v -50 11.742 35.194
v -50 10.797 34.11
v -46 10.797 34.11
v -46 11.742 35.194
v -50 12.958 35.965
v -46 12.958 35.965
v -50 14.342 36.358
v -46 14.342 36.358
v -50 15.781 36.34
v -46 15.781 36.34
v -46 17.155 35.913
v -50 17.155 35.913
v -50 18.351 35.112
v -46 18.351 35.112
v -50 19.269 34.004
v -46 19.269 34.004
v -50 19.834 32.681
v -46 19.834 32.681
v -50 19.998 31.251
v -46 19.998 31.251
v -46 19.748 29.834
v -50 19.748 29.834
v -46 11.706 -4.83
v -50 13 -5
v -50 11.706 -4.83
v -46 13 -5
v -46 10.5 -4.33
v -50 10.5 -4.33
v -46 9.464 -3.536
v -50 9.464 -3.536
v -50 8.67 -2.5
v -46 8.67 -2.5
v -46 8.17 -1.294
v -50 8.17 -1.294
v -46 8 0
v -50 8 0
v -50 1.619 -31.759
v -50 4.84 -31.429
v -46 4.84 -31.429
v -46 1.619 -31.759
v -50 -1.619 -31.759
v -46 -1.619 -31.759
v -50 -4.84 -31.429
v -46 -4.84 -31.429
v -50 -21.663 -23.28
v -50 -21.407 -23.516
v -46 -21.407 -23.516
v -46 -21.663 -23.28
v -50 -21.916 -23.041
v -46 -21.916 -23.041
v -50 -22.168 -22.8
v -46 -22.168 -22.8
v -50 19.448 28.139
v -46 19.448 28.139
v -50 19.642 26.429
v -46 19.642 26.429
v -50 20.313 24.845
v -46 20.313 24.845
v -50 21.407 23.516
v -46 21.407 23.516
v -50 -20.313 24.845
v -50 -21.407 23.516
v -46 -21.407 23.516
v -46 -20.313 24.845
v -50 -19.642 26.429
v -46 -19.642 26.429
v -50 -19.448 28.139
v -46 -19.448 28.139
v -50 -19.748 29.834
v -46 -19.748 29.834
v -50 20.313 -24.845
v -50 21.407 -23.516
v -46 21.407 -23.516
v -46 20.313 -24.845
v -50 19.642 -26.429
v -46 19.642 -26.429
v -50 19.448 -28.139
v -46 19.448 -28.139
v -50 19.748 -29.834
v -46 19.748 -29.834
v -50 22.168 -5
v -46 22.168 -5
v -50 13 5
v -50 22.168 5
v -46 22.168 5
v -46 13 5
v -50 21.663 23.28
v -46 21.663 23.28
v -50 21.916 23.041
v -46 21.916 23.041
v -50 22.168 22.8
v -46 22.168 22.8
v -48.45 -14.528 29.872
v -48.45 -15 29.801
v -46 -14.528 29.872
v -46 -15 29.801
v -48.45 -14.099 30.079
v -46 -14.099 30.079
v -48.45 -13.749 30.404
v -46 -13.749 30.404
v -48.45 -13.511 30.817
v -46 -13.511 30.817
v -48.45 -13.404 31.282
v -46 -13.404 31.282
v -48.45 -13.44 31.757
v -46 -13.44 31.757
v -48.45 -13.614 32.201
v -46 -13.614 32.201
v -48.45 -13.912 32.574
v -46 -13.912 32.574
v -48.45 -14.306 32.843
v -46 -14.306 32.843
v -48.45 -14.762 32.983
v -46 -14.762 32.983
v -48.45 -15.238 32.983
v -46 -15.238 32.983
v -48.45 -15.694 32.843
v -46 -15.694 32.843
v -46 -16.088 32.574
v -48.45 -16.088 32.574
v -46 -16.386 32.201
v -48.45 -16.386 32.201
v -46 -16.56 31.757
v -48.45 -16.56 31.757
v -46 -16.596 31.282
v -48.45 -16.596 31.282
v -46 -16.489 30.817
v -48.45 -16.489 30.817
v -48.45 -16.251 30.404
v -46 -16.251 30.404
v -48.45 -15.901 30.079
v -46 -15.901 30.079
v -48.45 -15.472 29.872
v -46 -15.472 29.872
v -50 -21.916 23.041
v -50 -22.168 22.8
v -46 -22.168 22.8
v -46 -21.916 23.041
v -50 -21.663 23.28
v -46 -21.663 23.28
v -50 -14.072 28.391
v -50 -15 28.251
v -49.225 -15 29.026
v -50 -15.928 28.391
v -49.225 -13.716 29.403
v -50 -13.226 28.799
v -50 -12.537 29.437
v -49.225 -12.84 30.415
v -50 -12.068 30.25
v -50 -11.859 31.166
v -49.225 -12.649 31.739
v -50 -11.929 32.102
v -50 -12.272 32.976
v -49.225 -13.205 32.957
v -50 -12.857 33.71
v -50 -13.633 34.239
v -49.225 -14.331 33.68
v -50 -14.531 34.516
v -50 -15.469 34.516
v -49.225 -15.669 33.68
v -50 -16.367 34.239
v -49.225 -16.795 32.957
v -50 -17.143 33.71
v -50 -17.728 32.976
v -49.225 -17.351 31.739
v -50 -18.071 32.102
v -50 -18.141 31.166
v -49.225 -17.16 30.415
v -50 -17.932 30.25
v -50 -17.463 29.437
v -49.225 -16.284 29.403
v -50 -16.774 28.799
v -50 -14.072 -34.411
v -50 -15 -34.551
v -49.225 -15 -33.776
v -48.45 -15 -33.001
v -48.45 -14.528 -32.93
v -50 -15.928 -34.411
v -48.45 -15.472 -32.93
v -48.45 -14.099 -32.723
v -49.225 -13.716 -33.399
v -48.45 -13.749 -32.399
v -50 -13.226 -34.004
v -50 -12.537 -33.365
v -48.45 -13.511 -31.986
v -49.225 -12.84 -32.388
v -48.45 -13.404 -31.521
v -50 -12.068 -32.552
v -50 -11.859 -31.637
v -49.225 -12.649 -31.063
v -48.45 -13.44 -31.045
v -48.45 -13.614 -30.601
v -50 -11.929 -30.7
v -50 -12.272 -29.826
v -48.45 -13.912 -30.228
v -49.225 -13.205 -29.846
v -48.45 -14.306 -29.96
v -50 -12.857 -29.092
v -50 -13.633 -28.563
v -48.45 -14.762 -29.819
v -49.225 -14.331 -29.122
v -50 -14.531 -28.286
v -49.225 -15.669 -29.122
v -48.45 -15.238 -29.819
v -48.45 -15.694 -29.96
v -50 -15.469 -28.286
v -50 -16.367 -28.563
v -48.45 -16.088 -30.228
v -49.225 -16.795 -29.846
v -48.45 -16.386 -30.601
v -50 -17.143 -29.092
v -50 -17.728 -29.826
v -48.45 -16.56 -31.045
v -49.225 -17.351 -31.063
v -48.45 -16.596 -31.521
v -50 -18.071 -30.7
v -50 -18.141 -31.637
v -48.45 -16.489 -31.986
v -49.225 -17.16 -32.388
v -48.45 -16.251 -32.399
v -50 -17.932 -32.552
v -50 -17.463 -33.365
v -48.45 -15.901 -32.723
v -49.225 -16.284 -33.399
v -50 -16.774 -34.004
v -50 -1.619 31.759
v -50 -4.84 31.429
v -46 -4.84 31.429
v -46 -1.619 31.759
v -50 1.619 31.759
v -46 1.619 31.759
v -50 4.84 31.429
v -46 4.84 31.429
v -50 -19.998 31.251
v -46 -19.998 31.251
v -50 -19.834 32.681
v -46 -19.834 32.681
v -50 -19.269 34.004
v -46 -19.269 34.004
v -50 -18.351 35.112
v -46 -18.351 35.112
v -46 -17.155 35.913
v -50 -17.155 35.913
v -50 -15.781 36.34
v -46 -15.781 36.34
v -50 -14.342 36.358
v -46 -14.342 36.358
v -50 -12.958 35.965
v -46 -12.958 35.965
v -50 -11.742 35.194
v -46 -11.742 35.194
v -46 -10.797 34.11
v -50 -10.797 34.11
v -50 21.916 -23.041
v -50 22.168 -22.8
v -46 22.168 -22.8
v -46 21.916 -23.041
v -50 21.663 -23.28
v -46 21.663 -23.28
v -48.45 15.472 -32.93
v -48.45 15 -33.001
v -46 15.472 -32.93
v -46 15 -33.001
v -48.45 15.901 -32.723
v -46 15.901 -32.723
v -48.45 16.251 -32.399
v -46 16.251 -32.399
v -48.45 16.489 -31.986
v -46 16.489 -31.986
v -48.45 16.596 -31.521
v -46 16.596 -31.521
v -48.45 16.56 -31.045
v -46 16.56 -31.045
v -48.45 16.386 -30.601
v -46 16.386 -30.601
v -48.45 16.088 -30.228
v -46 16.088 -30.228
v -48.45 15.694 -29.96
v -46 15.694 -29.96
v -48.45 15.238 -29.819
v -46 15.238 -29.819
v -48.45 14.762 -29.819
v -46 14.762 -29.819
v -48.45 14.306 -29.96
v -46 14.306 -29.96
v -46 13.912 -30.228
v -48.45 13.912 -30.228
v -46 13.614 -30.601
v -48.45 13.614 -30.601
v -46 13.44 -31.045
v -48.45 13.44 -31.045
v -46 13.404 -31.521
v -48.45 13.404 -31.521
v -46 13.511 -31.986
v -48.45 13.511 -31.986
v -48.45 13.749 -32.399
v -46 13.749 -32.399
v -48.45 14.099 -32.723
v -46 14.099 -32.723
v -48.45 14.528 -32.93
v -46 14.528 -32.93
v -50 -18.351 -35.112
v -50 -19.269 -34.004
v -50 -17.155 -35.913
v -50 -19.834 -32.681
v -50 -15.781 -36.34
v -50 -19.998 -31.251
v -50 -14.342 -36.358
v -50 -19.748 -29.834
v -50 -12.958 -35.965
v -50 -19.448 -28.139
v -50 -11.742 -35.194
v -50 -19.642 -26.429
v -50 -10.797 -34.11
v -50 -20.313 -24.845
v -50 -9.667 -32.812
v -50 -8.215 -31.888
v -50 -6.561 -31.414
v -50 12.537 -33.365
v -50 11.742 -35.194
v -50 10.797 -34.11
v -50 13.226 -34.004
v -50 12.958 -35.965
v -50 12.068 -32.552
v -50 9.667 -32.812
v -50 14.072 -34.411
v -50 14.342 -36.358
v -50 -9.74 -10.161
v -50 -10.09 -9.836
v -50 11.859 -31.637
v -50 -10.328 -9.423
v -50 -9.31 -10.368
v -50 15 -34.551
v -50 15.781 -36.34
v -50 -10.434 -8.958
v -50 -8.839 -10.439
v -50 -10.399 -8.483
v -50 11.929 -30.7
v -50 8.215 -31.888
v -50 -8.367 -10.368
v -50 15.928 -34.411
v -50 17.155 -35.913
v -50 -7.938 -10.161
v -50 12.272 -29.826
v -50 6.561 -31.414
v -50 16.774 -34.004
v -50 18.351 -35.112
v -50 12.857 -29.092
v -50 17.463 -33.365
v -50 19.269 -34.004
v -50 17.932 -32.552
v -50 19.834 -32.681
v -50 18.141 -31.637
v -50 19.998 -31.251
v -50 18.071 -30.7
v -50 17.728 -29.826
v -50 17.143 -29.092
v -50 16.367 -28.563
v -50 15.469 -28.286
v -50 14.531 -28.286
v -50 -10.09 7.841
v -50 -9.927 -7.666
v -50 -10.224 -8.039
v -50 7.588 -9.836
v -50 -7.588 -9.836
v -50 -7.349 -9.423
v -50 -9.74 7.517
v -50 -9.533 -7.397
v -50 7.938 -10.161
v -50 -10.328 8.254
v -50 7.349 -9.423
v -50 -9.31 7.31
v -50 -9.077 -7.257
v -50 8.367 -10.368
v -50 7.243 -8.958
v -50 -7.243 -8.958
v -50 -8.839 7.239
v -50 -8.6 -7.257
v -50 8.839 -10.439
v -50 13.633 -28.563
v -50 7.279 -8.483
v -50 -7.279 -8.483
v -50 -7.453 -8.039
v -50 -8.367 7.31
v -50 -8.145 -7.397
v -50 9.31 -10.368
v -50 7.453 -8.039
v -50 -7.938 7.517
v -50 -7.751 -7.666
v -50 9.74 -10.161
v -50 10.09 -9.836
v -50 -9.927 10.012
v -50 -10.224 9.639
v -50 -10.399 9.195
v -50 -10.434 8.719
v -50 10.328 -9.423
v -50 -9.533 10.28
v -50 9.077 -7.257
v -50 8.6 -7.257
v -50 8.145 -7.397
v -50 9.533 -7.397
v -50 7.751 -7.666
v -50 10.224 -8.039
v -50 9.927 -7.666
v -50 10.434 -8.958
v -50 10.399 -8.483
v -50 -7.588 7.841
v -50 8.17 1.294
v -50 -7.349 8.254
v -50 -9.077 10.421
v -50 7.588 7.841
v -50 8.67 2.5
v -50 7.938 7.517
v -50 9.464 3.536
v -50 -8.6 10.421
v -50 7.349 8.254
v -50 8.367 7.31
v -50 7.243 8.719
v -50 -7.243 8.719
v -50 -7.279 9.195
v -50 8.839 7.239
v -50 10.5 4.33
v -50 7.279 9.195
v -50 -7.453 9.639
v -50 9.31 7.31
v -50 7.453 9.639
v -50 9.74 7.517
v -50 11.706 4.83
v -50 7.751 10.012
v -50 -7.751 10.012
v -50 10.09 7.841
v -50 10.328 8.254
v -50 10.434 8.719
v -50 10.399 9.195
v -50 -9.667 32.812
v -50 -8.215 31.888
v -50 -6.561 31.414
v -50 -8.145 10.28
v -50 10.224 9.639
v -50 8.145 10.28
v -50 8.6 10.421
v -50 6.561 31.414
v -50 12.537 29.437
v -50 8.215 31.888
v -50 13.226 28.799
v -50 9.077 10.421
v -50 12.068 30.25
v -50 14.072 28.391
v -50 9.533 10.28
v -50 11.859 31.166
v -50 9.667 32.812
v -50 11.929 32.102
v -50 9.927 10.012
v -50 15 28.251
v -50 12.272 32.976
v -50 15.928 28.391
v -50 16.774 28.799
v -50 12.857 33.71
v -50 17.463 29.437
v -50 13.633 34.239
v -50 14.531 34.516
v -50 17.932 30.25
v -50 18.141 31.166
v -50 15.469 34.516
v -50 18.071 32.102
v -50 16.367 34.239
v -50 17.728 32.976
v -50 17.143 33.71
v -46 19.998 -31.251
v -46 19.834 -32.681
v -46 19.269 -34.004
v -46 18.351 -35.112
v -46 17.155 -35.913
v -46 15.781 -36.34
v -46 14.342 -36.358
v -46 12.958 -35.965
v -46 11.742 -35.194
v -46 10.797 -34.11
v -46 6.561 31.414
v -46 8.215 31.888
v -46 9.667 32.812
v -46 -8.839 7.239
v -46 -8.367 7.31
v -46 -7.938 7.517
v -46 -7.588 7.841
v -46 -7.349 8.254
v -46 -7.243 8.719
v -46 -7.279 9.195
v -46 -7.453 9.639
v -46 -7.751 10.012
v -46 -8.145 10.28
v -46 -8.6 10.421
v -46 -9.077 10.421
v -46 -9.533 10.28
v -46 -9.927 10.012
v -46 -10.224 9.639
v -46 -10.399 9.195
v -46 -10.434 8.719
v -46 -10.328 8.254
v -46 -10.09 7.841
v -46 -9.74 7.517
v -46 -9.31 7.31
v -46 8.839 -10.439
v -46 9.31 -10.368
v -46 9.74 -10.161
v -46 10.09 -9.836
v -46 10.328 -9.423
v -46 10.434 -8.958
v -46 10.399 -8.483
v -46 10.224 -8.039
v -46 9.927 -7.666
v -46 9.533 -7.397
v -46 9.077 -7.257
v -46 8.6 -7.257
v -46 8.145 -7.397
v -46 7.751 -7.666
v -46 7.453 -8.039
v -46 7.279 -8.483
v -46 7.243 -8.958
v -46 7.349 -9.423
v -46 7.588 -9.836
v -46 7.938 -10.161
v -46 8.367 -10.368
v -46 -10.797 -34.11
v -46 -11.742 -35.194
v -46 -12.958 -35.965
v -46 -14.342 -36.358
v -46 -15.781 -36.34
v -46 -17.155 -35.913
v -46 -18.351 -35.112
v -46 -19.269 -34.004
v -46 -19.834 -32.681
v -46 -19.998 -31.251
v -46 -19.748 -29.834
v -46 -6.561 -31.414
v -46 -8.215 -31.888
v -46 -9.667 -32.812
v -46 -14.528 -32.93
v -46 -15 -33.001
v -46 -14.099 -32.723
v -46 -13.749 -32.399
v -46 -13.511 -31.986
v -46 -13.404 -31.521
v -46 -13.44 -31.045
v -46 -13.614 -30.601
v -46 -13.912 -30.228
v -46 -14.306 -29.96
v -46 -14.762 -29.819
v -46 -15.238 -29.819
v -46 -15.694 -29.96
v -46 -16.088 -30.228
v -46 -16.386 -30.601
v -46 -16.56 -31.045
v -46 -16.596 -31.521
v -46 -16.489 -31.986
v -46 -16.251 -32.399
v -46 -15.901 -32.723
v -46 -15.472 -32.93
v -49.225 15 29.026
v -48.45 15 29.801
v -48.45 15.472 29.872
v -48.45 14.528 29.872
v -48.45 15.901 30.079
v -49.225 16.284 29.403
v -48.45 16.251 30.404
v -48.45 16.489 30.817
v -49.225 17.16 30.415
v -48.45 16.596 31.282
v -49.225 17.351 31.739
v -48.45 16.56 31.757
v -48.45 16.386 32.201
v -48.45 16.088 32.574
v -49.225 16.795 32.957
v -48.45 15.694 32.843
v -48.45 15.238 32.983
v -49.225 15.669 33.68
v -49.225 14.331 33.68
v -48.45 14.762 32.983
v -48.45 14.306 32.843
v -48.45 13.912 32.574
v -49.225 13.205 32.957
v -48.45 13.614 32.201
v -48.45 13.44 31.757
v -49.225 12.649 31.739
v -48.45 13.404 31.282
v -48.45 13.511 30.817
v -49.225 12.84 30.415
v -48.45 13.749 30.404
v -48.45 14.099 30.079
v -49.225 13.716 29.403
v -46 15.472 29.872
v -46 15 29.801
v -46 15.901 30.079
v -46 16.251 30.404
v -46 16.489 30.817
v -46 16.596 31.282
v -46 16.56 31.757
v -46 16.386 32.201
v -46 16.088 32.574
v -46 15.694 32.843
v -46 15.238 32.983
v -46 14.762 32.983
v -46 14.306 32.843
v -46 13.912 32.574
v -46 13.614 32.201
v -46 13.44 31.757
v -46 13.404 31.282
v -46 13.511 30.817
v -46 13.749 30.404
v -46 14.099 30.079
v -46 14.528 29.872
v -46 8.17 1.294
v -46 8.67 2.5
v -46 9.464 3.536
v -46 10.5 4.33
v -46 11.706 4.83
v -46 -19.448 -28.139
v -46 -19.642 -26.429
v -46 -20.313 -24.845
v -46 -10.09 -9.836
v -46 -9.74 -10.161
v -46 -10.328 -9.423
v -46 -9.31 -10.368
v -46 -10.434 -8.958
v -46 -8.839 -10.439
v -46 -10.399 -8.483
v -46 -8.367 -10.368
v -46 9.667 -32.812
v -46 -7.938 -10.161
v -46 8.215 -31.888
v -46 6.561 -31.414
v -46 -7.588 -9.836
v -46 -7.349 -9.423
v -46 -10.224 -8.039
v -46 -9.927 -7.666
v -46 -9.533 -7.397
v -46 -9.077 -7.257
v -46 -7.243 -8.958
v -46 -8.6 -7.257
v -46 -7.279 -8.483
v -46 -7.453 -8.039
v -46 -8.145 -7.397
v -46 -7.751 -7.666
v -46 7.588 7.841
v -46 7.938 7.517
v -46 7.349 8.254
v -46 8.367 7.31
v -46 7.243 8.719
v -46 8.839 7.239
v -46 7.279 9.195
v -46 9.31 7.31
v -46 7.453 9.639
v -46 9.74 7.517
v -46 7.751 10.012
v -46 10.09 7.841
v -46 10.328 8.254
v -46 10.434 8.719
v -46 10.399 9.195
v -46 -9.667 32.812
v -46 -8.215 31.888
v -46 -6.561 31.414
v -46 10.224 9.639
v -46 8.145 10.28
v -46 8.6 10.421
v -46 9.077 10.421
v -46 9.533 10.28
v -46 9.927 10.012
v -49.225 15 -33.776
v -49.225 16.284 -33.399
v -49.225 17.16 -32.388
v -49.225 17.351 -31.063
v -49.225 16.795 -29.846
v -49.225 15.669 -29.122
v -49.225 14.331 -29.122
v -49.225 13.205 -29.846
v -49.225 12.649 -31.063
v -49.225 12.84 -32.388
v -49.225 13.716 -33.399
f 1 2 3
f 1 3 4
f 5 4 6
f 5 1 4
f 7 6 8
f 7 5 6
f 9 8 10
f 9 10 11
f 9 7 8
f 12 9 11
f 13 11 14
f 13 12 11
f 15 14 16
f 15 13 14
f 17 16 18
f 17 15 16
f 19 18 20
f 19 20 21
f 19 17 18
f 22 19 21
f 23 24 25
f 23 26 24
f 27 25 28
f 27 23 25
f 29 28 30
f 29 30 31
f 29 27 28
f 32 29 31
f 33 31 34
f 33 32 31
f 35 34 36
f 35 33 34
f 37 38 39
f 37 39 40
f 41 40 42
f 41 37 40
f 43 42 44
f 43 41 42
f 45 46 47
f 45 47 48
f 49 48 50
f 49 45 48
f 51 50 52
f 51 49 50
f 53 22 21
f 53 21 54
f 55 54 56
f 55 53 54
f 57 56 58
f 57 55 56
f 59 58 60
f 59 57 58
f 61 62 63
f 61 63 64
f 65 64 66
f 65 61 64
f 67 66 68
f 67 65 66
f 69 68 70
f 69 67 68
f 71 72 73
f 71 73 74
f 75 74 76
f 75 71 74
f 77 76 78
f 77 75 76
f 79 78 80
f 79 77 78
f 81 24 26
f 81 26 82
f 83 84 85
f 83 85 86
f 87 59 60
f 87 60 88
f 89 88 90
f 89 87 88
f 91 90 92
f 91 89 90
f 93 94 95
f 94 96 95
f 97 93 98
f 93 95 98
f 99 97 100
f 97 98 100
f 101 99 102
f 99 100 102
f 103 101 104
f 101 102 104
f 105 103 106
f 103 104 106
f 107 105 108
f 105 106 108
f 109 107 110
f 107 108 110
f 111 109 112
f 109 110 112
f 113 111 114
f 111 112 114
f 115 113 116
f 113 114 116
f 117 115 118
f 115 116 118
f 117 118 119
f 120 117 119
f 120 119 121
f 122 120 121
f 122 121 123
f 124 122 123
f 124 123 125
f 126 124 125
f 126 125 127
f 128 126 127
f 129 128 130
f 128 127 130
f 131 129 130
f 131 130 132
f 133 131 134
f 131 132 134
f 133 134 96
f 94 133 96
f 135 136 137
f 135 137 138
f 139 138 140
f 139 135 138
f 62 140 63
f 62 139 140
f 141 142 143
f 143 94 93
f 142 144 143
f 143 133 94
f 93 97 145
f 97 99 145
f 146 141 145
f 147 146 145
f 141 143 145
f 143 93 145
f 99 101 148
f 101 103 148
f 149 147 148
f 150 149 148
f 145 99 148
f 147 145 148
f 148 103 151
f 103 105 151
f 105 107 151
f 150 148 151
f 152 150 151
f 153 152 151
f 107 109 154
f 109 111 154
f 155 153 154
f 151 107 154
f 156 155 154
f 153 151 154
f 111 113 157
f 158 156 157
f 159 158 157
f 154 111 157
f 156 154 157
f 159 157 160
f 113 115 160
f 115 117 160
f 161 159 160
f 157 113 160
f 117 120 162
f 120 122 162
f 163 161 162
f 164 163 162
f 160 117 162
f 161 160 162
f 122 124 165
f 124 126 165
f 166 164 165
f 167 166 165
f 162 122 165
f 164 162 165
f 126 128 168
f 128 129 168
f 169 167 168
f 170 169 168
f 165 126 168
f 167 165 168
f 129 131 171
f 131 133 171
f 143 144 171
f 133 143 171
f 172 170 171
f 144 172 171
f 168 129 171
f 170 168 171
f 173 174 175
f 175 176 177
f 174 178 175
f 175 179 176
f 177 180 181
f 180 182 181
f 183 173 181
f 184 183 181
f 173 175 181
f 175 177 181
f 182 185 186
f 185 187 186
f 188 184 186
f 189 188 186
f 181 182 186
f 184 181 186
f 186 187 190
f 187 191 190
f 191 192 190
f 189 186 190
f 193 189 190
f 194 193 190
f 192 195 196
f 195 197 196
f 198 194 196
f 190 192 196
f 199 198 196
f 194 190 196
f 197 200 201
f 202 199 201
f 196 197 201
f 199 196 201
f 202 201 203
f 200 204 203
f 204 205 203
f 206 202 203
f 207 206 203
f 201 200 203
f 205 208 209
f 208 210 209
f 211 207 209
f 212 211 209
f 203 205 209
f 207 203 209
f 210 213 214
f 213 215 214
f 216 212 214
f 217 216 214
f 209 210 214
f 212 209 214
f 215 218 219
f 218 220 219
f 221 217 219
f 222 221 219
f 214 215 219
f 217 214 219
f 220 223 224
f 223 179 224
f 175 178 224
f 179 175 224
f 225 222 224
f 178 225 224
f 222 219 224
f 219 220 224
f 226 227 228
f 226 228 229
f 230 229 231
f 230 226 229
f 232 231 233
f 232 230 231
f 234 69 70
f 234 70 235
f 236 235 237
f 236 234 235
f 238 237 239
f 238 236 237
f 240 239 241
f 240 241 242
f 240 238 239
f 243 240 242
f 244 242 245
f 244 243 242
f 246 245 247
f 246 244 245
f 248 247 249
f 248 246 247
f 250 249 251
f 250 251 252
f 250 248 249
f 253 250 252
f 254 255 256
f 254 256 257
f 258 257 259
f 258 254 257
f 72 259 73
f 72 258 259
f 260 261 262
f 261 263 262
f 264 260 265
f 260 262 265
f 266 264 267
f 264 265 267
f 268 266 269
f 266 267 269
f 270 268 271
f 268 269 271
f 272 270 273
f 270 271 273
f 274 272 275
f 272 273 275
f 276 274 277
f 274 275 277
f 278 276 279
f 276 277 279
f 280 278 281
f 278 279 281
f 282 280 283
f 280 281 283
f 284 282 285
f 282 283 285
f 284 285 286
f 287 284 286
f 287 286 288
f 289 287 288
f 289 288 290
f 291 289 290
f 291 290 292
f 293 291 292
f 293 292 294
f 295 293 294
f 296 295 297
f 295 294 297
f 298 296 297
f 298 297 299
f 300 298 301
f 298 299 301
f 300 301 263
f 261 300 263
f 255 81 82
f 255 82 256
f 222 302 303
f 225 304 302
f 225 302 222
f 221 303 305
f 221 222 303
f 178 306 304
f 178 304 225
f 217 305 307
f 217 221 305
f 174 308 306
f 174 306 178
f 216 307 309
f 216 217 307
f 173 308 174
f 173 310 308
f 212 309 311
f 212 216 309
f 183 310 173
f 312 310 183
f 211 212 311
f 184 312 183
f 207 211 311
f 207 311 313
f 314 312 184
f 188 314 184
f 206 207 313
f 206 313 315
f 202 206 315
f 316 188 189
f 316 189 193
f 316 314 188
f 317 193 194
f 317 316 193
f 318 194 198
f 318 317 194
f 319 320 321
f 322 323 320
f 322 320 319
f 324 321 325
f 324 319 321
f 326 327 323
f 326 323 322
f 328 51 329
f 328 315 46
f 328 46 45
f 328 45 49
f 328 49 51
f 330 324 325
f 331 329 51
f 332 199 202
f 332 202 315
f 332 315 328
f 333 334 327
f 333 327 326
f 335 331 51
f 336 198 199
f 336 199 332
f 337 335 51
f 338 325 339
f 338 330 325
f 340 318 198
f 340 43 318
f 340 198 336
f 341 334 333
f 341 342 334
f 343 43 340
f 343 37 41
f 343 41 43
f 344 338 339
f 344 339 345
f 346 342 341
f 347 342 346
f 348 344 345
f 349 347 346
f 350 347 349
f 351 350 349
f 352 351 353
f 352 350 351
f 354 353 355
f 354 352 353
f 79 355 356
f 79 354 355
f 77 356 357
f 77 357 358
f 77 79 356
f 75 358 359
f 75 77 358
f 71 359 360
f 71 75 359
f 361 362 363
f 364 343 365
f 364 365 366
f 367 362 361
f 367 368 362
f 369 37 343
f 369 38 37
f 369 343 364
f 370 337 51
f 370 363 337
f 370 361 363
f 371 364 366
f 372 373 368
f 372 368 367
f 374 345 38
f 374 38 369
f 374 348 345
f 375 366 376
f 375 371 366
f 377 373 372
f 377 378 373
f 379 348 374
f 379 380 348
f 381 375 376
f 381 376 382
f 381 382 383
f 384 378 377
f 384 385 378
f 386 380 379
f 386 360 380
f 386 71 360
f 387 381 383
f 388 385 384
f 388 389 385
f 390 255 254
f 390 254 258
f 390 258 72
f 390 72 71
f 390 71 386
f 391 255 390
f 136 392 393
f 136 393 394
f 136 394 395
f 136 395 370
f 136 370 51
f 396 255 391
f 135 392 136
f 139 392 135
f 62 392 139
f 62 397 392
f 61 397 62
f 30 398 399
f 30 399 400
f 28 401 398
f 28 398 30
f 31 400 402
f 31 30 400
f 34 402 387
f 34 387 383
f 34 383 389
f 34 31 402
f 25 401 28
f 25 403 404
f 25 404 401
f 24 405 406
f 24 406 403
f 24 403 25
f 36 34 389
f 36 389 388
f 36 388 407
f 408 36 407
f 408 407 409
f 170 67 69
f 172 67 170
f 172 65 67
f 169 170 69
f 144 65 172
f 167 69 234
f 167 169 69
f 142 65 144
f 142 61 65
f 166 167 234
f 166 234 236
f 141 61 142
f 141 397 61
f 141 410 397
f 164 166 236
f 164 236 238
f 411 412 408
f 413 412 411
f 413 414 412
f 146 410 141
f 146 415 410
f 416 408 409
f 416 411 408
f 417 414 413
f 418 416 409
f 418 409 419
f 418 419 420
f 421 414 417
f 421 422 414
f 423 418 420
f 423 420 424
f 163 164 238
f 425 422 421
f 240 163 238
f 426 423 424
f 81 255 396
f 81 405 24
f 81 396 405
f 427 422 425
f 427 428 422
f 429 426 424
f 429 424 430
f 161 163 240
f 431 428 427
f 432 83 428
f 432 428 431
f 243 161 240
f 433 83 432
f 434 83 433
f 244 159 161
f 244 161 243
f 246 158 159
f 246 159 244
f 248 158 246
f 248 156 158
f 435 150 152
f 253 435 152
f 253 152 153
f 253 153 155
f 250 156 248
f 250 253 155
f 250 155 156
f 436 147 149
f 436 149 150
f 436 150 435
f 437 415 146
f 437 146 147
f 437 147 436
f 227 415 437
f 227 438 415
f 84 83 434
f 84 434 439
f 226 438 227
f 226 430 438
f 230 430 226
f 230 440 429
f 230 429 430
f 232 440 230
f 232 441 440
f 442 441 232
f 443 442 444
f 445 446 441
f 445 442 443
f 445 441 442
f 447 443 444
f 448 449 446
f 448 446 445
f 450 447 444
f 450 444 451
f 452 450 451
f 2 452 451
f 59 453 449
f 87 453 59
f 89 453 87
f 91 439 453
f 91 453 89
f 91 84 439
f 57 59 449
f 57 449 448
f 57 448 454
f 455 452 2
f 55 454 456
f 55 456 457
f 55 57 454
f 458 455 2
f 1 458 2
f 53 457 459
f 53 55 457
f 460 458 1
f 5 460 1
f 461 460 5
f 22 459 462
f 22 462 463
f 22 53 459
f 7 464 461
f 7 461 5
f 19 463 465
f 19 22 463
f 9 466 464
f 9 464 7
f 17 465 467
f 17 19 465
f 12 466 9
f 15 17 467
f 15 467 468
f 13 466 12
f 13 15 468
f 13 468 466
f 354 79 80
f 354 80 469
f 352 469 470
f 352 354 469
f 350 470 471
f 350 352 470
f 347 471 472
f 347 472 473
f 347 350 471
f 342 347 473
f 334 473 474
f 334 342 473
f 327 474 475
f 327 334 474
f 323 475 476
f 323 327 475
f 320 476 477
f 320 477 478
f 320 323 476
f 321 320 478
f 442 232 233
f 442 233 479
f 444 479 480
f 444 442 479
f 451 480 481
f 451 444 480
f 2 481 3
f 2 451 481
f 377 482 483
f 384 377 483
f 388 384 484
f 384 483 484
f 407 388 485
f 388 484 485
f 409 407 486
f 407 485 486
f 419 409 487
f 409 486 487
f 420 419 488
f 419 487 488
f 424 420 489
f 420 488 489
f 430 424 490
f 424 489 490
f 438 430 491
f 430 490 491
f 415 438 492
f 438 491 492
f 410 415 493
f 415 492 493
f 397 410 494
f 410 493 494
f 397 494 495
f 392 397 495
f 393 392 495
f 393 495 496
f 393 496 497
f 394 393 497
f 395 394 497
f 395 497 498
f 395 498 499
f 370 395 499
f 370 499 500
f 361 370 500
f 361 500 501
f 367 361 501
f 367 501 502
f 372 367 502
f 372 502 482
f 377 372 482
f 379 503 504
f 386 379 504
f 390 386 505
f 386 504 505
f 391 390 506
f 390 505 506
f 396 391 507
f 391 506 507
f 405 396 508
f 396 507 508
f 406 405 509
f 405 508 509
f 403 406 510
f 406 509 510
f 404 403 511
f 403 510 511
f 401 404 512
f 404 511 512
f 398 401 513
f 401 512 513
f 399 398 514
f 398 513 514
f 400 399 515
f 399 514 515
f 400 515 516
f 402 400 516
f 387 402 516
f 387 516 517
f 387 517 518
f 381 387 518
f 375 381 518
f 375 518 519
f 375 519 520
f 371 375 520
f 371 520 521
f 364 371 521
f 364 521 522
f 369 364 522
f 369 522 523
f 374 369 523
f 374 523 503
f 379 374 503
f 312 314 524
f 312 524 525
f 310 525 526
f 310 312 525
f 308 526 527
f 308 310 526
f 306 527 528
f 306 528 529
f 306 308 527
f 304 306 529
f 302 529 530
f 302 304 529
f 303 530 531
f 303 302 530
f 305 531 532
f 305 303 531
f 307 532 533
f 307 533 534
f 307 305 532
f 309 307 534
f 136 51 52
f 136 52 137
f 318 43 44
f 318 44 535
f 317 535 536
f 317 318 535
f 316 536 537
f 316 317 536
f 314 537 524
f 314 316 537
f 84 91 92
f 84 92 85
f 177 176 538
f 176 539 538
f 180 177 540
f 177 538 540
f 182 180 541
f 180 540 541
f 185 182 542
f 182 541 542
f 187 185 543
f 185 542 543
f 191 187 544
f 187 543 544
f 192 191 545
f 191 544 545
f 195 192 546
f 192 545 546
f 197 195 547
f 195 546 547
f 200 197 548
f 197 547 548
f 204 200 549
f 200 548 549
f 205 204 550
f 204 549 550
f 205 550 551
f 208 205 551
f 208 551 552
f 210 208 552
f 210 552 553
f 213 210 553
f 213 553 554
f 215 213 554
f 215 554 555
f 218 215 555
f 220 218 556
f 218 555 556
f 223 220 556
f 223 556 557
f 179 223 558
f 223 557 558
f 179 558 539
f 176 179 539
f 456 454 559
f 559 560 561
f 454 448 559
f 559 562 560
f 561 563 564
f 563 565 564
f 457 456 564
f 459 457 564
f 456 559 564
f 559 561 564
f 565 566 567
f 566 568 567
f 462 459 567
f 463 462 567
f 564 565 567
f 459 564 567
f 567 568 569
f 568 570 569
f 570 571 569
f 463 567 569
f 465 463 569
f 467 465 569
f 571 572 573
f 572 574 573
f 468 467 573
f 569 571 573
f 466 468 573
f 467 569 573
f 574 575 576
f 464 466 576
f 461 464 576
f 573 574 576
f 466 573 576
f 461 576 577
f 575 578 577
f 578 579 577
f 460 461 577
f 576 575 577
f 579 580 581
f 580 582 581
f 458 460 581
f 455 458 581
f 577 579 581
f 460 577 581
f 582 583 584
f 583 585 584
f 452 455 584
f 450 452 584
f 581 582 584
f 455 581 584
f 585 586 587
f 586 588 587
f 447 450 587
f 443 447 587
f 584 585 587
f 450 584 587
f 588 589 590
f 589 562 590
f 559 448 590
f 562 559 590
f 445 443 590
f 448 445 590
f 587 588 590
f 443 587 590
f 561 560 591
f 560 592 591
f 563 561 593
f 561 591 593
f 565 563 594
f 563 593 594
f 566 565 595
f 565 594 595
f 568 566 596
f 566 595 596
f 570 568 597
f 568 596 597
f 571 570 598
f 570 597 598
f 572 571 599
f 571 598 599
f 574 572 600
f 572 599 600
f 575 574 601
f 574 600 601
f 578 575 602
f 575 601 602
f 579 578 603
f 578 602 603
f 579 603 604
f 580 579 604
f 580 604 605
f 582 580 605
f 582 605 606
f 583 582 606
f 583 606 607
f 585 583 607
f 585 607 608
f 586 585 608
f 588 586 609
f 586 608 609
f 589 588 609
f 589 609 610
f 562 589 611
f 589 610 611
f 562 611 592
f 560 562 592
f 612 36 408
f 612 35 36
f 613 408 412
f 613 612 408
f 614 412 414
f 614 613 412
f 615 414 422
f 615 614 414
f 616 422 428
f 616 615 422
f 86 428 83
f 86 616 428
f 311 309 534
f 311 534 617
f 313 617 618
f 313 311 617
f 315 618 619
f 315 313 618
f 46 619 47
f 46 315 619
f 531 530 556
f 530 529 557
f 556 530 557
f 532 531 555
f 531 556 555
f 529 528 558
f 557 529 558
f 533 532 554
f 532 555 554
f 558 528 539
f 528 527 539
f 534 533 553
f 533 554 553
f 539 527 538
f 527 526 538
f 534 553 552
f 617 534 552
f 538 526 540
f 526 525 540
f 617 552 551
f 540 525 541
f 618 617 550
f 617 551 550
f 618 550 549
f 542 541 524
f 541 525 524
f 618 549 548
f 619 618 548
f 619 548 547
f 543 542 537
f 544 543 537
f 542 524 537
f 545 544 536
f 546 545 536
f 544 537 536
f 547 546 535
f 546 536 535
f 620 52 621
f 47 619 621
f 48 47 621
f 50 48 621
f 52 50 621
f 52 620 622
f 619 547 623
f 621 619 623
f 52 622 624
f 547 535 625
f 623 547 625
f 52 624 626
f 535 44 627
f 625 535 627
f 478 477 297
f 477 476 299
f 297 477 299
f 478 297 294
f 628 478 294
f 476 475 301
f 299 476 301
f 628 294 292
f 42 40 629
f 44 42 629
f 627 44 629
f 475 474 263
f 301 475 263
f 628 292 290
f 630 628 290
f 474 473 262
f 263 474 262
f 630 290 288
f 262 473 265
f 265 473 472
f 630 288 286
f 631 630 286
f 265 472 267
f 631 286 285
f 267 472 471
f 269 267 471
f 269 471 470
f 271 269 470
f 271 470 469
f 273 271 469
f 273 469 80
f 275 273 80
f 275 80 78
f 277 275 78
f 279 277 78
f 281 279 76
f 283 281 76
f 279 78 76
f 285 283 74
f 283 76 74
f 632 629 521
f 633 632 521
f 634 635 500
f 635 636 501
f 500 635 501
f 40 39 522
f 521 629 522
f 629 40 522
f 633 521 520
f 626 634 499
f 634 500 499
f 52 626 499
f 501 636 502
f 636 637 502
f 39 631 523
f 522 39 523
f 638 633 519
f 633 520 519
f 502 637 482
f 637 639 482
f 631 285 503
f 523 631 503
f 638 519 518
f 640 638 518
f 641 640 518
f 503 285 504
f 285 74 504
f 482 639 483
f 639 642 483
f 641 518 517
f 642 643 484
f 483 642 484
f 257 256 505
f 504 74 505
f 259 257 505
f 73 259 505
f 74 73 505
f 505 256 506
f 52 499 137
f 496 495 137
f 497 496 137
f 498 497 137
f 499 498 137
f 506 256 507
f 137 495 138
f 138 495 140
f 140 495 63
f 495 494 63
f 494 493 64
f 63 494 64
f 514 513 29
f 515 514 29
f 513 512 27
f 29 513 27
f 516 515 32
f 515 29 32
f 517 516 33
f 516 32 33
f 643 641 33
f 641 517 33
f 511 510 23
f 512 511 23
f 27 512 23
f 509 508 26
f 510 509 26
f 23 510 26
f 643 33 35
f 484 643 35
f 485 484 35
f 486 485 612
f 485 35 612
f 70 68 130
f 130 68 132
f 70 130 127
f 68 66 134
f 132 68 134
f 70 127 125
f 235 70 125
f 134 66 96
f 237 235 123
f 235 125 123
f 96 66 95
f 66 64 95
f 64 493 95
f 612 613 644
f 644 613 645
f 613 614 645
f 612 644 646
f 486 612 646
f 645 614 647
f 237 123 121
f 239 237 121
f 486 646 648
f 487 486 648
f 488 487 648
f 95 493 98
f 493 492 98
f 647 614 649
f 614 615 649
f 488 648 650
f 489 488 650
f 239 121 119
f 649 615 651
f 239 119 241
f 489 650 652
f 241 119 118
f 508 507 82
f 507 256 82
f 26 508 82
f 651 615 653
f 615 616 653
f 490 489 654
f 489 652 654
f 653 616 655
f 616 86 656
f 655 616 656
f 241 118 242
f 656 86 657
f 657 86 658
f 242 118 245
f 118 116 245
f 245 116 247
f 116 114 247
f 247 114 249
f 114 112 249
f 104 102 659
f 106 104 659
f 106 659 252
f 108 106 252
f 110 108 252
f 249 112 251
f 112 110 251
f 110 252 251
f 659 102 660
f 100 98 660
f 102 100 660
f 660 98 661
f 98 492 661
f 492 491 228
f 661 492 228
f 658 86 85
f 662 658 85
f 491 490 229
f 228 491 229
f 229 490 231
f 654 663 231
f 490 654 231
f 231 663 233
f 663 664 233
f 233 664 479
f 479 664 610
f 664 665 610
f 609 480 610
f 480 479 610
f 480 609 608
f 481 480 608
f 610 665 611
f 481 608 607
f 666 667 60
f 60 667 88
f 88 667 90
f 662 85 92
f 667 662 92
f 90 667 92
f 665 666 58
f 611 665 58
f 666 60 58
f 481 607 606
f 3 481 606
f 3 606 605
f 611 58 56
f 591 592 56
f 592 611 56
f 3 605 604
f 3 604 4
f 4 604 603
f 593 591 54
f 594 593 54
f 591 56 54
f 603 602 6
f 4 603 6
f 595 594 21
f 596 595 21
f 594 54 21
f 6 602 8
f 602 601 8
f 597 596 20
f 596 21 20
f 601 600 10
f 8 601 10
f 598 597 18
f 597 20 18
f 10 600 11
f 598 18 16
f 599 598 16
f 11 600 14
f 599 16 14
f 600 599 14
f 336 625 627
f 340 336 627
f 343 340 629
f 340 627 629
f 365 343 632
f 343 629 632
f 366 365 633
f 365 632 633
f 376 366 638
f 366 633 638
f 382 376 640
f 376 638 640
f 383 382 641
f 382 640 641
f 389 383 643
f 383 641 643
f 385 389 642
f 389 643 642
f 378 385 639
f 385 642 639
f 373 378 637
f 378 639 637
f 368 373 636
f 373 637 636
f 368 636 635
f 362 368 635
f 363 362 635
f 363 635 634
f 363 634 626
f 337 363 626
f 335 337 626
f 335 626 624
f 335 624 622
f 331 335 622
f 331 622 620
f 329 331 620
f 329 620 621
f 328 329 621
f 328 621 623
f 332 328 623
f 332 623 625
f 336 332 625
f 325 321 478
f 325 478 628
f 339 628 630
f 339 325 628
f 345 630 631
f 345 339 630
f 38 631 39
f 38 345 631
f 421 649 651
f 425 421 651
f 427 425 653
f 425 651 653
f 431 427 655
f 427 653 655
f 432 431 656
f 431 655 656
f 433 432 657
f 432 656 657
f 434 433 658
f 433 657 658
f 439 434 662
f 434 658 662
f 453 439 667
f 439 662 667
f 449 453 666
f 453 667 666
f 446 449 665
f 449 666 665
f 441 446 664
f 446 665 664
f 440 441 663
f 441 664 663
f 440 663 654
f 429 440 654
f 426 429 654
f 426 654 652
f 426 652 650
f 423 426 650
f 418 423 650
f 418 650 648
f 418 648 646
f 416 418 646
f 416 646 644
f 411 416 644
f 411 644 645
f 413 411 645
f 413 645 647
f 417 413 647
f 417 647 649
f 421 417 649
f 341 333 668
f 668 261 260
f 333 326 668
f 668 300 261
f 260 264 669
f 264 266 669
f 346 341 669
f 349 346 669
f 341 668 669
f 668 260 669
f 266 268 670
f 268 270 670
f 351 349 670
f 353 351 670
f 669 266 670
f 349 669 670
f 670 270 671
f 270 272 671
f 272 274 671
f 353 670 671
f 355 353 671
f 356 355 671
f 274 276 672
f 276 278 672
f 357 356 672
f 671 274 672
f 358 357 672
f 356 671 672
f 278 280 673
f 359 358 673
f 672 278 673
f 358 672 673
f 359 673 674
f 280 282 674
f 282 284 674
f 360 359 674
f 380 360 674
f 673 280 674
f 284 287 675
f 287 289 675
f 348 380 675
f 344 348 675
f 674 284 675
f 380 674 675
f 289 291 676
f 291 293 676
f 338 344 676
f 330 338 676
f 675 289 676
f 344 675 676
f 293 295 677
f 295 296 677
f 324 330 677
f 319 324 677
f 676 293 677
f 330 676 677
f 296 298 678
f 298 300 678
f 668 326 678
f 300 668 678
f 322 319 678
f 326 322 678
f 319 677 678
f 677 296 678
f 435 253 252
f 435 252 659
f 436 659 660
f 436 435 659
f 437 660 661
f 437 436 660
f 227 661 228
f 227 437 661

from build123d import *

# Parameters (mm, degrees)
BOSS_EXTRUDE1_START                                 = -50
BOSS_EXTRUDE1_DEPTH                                 = 4
CSK_FOR_M3_COUNTERSUNK_FLAT_HEAD_SCREW1_D           = 3.2
CSK_FOR_M3_COUNTERSUNK_FLAT_HEAD_SCREW1_CSINK_D     = 6.3
CSK_FOR_M3_COUNTERSUNK_FLAT_HEAD_SCREW1_CSINK_ANGLE = 90
M3_CLEARANCE_HOLE1_D                                = 3.2
FILLET1_R                                           = 5


with BuildPart() as part:
    # Sketch2 → Boss-Extrude1 (new body)
    with BuildSketch(Plane(origin=(0, 0, 0), x_dir=(0, 0, -1), z_dir=(1, 0, 0)).offset(BOSS_EXTRUDE1_START)):
        with BuildLine():
            Line((5, 8), (5, 22.167543842))
            Line((5, 22.167543842), (22.8, 22.167543842))
            ThreePointArc((22.8, 22.167543842), (23.161099135, 21.78998593), (23.515946886, 21.40654671))
            ThreePointArc((23.515946886, 21.40654671), (26.429411238, 19.642162968), (29.833839376, 19.747962631))
            ThreePointArc((29.833839376, 19.747962631), (35.912951138, 17.155172414), (34.109592252, 10.797023497))
            ThreePointArc((34.109592252, 10.797023497), (31.887887506, 8.215289092), (31.429483161, 4.840205393))
            ThreePointArc((31.429483161, 4.840205393), (31.8, 0), (31.429483161, -4.840205393))
            ThreePointArc((31.429483161, -4.840205393), (31.887887506, -8.215289092), (34.109592252, -10.797023497))
            ThreePointArc((34.109592252, -10.797023497), (35.912951138, -17.155172414), (29.833839376, -19.747962631))
            ThreePointArc((29.833839376, -19.747962631), (26.429411238, -19.642162968), (23.515946886, -21.40654671))
            ThreePointArc((23.515946886, -21.40654671), (23.161099135, -21.78998593), (22.8, -22.167543842))
            Line((22.8, -22.167543842), (-22.8, -22.167543842))
            ThreePointArc((-22.8, -22.167543842), (-23.161099135, -21.78998593), (-23.515946886, -21.40654671))
            ThreePointArc((-23.515946886, -21.40654671), (-26.429411238, -19.642162968), (-29.833839376, -19.747962631))
            ThreePointArc((-29.833839376, -19.747962631), (-35.912951138, -17.155172414), (-34.109592252, -10.797023497))
            ThreePointArc((-34.109592252, -10.797023497), (-31.887887506, -8.215289092), (-31.429483161, -4.840205393))
            ThreePointArc((-31.429483161, -4.840205393), (-31.8, 0), (-31.429483161, 4.840205393))
            ThreePointArc((-31.429483161, 4.840205393), (-31.887887506, 8.215289092), (-34.109592252, 10.797023497))
            ThreePointArc((-34.109592252, 10.797023497), (-35.912951138, 17.155172414), (-29.833839376, 19.747962631))
            ThreePointArc((-29.833839376, 19.747962631), (-26.429411238, 19.642162968), (-23.515946886, 21.40654671))
            ThreePointArc((-23.515946886, 21.40654671), (-23.161099135, 21.78998593), (-22.8, 22.167543842))
            Line((-22.8, 22.167543842), (-5, 22.167543842))
            Line((-5, 22.167543842), (-5, 8))
            Line((-5, 8), (5, 8))
        make_face()
    extrude(amount=BOSS_EXTRUDE1_DEPTH)

    # CSK for M3 Countersunk Flat Head Screw1 (through all)
    with Locations(Plane.ZY.offset(50)):
        with Locations((-31.40127386, 15), (-31.40127386, -15), (31.40127386, 15), (31.40127386, -15)):
            CounterSinkHole(CSK_FOR_M3_COUNTERSUNK_FLAT_HEAD_SCREW1_D / 2, CSK_FOR_M3_COUNTERSUNK_FLAT_HEAD_SCREW1_CSINK_D / 2, counter_sink_angle=CSK_FOR_M3_COUNTERSUNK_FLAT_HEAD_SCREW1_CSINK_ANGLE)

    # M3 Clearance Hole1 (through all)
    with Locations(Plane.ZY.offset(50)):
        with Locations((-8.838834765, 8.838834765), (-8.838834765, -8.838834765), (8.838834765, -8.838834765), (8.838834765, 8.838834765)):
            Hole(M3_CLEARANCE_HOLE1_D / 2)

    # Fillet1
    fillet1_edges = [part.edges().sort_by_distance(p)[0] for p in [
        (-48, 8, 5),
        (-48, 8, -5),
    ]]
    fillet(fillet1_edges, radius=FILLET1_R - 0.0001)  # a hair under: the kernel refuses the full size


solid = part.part
